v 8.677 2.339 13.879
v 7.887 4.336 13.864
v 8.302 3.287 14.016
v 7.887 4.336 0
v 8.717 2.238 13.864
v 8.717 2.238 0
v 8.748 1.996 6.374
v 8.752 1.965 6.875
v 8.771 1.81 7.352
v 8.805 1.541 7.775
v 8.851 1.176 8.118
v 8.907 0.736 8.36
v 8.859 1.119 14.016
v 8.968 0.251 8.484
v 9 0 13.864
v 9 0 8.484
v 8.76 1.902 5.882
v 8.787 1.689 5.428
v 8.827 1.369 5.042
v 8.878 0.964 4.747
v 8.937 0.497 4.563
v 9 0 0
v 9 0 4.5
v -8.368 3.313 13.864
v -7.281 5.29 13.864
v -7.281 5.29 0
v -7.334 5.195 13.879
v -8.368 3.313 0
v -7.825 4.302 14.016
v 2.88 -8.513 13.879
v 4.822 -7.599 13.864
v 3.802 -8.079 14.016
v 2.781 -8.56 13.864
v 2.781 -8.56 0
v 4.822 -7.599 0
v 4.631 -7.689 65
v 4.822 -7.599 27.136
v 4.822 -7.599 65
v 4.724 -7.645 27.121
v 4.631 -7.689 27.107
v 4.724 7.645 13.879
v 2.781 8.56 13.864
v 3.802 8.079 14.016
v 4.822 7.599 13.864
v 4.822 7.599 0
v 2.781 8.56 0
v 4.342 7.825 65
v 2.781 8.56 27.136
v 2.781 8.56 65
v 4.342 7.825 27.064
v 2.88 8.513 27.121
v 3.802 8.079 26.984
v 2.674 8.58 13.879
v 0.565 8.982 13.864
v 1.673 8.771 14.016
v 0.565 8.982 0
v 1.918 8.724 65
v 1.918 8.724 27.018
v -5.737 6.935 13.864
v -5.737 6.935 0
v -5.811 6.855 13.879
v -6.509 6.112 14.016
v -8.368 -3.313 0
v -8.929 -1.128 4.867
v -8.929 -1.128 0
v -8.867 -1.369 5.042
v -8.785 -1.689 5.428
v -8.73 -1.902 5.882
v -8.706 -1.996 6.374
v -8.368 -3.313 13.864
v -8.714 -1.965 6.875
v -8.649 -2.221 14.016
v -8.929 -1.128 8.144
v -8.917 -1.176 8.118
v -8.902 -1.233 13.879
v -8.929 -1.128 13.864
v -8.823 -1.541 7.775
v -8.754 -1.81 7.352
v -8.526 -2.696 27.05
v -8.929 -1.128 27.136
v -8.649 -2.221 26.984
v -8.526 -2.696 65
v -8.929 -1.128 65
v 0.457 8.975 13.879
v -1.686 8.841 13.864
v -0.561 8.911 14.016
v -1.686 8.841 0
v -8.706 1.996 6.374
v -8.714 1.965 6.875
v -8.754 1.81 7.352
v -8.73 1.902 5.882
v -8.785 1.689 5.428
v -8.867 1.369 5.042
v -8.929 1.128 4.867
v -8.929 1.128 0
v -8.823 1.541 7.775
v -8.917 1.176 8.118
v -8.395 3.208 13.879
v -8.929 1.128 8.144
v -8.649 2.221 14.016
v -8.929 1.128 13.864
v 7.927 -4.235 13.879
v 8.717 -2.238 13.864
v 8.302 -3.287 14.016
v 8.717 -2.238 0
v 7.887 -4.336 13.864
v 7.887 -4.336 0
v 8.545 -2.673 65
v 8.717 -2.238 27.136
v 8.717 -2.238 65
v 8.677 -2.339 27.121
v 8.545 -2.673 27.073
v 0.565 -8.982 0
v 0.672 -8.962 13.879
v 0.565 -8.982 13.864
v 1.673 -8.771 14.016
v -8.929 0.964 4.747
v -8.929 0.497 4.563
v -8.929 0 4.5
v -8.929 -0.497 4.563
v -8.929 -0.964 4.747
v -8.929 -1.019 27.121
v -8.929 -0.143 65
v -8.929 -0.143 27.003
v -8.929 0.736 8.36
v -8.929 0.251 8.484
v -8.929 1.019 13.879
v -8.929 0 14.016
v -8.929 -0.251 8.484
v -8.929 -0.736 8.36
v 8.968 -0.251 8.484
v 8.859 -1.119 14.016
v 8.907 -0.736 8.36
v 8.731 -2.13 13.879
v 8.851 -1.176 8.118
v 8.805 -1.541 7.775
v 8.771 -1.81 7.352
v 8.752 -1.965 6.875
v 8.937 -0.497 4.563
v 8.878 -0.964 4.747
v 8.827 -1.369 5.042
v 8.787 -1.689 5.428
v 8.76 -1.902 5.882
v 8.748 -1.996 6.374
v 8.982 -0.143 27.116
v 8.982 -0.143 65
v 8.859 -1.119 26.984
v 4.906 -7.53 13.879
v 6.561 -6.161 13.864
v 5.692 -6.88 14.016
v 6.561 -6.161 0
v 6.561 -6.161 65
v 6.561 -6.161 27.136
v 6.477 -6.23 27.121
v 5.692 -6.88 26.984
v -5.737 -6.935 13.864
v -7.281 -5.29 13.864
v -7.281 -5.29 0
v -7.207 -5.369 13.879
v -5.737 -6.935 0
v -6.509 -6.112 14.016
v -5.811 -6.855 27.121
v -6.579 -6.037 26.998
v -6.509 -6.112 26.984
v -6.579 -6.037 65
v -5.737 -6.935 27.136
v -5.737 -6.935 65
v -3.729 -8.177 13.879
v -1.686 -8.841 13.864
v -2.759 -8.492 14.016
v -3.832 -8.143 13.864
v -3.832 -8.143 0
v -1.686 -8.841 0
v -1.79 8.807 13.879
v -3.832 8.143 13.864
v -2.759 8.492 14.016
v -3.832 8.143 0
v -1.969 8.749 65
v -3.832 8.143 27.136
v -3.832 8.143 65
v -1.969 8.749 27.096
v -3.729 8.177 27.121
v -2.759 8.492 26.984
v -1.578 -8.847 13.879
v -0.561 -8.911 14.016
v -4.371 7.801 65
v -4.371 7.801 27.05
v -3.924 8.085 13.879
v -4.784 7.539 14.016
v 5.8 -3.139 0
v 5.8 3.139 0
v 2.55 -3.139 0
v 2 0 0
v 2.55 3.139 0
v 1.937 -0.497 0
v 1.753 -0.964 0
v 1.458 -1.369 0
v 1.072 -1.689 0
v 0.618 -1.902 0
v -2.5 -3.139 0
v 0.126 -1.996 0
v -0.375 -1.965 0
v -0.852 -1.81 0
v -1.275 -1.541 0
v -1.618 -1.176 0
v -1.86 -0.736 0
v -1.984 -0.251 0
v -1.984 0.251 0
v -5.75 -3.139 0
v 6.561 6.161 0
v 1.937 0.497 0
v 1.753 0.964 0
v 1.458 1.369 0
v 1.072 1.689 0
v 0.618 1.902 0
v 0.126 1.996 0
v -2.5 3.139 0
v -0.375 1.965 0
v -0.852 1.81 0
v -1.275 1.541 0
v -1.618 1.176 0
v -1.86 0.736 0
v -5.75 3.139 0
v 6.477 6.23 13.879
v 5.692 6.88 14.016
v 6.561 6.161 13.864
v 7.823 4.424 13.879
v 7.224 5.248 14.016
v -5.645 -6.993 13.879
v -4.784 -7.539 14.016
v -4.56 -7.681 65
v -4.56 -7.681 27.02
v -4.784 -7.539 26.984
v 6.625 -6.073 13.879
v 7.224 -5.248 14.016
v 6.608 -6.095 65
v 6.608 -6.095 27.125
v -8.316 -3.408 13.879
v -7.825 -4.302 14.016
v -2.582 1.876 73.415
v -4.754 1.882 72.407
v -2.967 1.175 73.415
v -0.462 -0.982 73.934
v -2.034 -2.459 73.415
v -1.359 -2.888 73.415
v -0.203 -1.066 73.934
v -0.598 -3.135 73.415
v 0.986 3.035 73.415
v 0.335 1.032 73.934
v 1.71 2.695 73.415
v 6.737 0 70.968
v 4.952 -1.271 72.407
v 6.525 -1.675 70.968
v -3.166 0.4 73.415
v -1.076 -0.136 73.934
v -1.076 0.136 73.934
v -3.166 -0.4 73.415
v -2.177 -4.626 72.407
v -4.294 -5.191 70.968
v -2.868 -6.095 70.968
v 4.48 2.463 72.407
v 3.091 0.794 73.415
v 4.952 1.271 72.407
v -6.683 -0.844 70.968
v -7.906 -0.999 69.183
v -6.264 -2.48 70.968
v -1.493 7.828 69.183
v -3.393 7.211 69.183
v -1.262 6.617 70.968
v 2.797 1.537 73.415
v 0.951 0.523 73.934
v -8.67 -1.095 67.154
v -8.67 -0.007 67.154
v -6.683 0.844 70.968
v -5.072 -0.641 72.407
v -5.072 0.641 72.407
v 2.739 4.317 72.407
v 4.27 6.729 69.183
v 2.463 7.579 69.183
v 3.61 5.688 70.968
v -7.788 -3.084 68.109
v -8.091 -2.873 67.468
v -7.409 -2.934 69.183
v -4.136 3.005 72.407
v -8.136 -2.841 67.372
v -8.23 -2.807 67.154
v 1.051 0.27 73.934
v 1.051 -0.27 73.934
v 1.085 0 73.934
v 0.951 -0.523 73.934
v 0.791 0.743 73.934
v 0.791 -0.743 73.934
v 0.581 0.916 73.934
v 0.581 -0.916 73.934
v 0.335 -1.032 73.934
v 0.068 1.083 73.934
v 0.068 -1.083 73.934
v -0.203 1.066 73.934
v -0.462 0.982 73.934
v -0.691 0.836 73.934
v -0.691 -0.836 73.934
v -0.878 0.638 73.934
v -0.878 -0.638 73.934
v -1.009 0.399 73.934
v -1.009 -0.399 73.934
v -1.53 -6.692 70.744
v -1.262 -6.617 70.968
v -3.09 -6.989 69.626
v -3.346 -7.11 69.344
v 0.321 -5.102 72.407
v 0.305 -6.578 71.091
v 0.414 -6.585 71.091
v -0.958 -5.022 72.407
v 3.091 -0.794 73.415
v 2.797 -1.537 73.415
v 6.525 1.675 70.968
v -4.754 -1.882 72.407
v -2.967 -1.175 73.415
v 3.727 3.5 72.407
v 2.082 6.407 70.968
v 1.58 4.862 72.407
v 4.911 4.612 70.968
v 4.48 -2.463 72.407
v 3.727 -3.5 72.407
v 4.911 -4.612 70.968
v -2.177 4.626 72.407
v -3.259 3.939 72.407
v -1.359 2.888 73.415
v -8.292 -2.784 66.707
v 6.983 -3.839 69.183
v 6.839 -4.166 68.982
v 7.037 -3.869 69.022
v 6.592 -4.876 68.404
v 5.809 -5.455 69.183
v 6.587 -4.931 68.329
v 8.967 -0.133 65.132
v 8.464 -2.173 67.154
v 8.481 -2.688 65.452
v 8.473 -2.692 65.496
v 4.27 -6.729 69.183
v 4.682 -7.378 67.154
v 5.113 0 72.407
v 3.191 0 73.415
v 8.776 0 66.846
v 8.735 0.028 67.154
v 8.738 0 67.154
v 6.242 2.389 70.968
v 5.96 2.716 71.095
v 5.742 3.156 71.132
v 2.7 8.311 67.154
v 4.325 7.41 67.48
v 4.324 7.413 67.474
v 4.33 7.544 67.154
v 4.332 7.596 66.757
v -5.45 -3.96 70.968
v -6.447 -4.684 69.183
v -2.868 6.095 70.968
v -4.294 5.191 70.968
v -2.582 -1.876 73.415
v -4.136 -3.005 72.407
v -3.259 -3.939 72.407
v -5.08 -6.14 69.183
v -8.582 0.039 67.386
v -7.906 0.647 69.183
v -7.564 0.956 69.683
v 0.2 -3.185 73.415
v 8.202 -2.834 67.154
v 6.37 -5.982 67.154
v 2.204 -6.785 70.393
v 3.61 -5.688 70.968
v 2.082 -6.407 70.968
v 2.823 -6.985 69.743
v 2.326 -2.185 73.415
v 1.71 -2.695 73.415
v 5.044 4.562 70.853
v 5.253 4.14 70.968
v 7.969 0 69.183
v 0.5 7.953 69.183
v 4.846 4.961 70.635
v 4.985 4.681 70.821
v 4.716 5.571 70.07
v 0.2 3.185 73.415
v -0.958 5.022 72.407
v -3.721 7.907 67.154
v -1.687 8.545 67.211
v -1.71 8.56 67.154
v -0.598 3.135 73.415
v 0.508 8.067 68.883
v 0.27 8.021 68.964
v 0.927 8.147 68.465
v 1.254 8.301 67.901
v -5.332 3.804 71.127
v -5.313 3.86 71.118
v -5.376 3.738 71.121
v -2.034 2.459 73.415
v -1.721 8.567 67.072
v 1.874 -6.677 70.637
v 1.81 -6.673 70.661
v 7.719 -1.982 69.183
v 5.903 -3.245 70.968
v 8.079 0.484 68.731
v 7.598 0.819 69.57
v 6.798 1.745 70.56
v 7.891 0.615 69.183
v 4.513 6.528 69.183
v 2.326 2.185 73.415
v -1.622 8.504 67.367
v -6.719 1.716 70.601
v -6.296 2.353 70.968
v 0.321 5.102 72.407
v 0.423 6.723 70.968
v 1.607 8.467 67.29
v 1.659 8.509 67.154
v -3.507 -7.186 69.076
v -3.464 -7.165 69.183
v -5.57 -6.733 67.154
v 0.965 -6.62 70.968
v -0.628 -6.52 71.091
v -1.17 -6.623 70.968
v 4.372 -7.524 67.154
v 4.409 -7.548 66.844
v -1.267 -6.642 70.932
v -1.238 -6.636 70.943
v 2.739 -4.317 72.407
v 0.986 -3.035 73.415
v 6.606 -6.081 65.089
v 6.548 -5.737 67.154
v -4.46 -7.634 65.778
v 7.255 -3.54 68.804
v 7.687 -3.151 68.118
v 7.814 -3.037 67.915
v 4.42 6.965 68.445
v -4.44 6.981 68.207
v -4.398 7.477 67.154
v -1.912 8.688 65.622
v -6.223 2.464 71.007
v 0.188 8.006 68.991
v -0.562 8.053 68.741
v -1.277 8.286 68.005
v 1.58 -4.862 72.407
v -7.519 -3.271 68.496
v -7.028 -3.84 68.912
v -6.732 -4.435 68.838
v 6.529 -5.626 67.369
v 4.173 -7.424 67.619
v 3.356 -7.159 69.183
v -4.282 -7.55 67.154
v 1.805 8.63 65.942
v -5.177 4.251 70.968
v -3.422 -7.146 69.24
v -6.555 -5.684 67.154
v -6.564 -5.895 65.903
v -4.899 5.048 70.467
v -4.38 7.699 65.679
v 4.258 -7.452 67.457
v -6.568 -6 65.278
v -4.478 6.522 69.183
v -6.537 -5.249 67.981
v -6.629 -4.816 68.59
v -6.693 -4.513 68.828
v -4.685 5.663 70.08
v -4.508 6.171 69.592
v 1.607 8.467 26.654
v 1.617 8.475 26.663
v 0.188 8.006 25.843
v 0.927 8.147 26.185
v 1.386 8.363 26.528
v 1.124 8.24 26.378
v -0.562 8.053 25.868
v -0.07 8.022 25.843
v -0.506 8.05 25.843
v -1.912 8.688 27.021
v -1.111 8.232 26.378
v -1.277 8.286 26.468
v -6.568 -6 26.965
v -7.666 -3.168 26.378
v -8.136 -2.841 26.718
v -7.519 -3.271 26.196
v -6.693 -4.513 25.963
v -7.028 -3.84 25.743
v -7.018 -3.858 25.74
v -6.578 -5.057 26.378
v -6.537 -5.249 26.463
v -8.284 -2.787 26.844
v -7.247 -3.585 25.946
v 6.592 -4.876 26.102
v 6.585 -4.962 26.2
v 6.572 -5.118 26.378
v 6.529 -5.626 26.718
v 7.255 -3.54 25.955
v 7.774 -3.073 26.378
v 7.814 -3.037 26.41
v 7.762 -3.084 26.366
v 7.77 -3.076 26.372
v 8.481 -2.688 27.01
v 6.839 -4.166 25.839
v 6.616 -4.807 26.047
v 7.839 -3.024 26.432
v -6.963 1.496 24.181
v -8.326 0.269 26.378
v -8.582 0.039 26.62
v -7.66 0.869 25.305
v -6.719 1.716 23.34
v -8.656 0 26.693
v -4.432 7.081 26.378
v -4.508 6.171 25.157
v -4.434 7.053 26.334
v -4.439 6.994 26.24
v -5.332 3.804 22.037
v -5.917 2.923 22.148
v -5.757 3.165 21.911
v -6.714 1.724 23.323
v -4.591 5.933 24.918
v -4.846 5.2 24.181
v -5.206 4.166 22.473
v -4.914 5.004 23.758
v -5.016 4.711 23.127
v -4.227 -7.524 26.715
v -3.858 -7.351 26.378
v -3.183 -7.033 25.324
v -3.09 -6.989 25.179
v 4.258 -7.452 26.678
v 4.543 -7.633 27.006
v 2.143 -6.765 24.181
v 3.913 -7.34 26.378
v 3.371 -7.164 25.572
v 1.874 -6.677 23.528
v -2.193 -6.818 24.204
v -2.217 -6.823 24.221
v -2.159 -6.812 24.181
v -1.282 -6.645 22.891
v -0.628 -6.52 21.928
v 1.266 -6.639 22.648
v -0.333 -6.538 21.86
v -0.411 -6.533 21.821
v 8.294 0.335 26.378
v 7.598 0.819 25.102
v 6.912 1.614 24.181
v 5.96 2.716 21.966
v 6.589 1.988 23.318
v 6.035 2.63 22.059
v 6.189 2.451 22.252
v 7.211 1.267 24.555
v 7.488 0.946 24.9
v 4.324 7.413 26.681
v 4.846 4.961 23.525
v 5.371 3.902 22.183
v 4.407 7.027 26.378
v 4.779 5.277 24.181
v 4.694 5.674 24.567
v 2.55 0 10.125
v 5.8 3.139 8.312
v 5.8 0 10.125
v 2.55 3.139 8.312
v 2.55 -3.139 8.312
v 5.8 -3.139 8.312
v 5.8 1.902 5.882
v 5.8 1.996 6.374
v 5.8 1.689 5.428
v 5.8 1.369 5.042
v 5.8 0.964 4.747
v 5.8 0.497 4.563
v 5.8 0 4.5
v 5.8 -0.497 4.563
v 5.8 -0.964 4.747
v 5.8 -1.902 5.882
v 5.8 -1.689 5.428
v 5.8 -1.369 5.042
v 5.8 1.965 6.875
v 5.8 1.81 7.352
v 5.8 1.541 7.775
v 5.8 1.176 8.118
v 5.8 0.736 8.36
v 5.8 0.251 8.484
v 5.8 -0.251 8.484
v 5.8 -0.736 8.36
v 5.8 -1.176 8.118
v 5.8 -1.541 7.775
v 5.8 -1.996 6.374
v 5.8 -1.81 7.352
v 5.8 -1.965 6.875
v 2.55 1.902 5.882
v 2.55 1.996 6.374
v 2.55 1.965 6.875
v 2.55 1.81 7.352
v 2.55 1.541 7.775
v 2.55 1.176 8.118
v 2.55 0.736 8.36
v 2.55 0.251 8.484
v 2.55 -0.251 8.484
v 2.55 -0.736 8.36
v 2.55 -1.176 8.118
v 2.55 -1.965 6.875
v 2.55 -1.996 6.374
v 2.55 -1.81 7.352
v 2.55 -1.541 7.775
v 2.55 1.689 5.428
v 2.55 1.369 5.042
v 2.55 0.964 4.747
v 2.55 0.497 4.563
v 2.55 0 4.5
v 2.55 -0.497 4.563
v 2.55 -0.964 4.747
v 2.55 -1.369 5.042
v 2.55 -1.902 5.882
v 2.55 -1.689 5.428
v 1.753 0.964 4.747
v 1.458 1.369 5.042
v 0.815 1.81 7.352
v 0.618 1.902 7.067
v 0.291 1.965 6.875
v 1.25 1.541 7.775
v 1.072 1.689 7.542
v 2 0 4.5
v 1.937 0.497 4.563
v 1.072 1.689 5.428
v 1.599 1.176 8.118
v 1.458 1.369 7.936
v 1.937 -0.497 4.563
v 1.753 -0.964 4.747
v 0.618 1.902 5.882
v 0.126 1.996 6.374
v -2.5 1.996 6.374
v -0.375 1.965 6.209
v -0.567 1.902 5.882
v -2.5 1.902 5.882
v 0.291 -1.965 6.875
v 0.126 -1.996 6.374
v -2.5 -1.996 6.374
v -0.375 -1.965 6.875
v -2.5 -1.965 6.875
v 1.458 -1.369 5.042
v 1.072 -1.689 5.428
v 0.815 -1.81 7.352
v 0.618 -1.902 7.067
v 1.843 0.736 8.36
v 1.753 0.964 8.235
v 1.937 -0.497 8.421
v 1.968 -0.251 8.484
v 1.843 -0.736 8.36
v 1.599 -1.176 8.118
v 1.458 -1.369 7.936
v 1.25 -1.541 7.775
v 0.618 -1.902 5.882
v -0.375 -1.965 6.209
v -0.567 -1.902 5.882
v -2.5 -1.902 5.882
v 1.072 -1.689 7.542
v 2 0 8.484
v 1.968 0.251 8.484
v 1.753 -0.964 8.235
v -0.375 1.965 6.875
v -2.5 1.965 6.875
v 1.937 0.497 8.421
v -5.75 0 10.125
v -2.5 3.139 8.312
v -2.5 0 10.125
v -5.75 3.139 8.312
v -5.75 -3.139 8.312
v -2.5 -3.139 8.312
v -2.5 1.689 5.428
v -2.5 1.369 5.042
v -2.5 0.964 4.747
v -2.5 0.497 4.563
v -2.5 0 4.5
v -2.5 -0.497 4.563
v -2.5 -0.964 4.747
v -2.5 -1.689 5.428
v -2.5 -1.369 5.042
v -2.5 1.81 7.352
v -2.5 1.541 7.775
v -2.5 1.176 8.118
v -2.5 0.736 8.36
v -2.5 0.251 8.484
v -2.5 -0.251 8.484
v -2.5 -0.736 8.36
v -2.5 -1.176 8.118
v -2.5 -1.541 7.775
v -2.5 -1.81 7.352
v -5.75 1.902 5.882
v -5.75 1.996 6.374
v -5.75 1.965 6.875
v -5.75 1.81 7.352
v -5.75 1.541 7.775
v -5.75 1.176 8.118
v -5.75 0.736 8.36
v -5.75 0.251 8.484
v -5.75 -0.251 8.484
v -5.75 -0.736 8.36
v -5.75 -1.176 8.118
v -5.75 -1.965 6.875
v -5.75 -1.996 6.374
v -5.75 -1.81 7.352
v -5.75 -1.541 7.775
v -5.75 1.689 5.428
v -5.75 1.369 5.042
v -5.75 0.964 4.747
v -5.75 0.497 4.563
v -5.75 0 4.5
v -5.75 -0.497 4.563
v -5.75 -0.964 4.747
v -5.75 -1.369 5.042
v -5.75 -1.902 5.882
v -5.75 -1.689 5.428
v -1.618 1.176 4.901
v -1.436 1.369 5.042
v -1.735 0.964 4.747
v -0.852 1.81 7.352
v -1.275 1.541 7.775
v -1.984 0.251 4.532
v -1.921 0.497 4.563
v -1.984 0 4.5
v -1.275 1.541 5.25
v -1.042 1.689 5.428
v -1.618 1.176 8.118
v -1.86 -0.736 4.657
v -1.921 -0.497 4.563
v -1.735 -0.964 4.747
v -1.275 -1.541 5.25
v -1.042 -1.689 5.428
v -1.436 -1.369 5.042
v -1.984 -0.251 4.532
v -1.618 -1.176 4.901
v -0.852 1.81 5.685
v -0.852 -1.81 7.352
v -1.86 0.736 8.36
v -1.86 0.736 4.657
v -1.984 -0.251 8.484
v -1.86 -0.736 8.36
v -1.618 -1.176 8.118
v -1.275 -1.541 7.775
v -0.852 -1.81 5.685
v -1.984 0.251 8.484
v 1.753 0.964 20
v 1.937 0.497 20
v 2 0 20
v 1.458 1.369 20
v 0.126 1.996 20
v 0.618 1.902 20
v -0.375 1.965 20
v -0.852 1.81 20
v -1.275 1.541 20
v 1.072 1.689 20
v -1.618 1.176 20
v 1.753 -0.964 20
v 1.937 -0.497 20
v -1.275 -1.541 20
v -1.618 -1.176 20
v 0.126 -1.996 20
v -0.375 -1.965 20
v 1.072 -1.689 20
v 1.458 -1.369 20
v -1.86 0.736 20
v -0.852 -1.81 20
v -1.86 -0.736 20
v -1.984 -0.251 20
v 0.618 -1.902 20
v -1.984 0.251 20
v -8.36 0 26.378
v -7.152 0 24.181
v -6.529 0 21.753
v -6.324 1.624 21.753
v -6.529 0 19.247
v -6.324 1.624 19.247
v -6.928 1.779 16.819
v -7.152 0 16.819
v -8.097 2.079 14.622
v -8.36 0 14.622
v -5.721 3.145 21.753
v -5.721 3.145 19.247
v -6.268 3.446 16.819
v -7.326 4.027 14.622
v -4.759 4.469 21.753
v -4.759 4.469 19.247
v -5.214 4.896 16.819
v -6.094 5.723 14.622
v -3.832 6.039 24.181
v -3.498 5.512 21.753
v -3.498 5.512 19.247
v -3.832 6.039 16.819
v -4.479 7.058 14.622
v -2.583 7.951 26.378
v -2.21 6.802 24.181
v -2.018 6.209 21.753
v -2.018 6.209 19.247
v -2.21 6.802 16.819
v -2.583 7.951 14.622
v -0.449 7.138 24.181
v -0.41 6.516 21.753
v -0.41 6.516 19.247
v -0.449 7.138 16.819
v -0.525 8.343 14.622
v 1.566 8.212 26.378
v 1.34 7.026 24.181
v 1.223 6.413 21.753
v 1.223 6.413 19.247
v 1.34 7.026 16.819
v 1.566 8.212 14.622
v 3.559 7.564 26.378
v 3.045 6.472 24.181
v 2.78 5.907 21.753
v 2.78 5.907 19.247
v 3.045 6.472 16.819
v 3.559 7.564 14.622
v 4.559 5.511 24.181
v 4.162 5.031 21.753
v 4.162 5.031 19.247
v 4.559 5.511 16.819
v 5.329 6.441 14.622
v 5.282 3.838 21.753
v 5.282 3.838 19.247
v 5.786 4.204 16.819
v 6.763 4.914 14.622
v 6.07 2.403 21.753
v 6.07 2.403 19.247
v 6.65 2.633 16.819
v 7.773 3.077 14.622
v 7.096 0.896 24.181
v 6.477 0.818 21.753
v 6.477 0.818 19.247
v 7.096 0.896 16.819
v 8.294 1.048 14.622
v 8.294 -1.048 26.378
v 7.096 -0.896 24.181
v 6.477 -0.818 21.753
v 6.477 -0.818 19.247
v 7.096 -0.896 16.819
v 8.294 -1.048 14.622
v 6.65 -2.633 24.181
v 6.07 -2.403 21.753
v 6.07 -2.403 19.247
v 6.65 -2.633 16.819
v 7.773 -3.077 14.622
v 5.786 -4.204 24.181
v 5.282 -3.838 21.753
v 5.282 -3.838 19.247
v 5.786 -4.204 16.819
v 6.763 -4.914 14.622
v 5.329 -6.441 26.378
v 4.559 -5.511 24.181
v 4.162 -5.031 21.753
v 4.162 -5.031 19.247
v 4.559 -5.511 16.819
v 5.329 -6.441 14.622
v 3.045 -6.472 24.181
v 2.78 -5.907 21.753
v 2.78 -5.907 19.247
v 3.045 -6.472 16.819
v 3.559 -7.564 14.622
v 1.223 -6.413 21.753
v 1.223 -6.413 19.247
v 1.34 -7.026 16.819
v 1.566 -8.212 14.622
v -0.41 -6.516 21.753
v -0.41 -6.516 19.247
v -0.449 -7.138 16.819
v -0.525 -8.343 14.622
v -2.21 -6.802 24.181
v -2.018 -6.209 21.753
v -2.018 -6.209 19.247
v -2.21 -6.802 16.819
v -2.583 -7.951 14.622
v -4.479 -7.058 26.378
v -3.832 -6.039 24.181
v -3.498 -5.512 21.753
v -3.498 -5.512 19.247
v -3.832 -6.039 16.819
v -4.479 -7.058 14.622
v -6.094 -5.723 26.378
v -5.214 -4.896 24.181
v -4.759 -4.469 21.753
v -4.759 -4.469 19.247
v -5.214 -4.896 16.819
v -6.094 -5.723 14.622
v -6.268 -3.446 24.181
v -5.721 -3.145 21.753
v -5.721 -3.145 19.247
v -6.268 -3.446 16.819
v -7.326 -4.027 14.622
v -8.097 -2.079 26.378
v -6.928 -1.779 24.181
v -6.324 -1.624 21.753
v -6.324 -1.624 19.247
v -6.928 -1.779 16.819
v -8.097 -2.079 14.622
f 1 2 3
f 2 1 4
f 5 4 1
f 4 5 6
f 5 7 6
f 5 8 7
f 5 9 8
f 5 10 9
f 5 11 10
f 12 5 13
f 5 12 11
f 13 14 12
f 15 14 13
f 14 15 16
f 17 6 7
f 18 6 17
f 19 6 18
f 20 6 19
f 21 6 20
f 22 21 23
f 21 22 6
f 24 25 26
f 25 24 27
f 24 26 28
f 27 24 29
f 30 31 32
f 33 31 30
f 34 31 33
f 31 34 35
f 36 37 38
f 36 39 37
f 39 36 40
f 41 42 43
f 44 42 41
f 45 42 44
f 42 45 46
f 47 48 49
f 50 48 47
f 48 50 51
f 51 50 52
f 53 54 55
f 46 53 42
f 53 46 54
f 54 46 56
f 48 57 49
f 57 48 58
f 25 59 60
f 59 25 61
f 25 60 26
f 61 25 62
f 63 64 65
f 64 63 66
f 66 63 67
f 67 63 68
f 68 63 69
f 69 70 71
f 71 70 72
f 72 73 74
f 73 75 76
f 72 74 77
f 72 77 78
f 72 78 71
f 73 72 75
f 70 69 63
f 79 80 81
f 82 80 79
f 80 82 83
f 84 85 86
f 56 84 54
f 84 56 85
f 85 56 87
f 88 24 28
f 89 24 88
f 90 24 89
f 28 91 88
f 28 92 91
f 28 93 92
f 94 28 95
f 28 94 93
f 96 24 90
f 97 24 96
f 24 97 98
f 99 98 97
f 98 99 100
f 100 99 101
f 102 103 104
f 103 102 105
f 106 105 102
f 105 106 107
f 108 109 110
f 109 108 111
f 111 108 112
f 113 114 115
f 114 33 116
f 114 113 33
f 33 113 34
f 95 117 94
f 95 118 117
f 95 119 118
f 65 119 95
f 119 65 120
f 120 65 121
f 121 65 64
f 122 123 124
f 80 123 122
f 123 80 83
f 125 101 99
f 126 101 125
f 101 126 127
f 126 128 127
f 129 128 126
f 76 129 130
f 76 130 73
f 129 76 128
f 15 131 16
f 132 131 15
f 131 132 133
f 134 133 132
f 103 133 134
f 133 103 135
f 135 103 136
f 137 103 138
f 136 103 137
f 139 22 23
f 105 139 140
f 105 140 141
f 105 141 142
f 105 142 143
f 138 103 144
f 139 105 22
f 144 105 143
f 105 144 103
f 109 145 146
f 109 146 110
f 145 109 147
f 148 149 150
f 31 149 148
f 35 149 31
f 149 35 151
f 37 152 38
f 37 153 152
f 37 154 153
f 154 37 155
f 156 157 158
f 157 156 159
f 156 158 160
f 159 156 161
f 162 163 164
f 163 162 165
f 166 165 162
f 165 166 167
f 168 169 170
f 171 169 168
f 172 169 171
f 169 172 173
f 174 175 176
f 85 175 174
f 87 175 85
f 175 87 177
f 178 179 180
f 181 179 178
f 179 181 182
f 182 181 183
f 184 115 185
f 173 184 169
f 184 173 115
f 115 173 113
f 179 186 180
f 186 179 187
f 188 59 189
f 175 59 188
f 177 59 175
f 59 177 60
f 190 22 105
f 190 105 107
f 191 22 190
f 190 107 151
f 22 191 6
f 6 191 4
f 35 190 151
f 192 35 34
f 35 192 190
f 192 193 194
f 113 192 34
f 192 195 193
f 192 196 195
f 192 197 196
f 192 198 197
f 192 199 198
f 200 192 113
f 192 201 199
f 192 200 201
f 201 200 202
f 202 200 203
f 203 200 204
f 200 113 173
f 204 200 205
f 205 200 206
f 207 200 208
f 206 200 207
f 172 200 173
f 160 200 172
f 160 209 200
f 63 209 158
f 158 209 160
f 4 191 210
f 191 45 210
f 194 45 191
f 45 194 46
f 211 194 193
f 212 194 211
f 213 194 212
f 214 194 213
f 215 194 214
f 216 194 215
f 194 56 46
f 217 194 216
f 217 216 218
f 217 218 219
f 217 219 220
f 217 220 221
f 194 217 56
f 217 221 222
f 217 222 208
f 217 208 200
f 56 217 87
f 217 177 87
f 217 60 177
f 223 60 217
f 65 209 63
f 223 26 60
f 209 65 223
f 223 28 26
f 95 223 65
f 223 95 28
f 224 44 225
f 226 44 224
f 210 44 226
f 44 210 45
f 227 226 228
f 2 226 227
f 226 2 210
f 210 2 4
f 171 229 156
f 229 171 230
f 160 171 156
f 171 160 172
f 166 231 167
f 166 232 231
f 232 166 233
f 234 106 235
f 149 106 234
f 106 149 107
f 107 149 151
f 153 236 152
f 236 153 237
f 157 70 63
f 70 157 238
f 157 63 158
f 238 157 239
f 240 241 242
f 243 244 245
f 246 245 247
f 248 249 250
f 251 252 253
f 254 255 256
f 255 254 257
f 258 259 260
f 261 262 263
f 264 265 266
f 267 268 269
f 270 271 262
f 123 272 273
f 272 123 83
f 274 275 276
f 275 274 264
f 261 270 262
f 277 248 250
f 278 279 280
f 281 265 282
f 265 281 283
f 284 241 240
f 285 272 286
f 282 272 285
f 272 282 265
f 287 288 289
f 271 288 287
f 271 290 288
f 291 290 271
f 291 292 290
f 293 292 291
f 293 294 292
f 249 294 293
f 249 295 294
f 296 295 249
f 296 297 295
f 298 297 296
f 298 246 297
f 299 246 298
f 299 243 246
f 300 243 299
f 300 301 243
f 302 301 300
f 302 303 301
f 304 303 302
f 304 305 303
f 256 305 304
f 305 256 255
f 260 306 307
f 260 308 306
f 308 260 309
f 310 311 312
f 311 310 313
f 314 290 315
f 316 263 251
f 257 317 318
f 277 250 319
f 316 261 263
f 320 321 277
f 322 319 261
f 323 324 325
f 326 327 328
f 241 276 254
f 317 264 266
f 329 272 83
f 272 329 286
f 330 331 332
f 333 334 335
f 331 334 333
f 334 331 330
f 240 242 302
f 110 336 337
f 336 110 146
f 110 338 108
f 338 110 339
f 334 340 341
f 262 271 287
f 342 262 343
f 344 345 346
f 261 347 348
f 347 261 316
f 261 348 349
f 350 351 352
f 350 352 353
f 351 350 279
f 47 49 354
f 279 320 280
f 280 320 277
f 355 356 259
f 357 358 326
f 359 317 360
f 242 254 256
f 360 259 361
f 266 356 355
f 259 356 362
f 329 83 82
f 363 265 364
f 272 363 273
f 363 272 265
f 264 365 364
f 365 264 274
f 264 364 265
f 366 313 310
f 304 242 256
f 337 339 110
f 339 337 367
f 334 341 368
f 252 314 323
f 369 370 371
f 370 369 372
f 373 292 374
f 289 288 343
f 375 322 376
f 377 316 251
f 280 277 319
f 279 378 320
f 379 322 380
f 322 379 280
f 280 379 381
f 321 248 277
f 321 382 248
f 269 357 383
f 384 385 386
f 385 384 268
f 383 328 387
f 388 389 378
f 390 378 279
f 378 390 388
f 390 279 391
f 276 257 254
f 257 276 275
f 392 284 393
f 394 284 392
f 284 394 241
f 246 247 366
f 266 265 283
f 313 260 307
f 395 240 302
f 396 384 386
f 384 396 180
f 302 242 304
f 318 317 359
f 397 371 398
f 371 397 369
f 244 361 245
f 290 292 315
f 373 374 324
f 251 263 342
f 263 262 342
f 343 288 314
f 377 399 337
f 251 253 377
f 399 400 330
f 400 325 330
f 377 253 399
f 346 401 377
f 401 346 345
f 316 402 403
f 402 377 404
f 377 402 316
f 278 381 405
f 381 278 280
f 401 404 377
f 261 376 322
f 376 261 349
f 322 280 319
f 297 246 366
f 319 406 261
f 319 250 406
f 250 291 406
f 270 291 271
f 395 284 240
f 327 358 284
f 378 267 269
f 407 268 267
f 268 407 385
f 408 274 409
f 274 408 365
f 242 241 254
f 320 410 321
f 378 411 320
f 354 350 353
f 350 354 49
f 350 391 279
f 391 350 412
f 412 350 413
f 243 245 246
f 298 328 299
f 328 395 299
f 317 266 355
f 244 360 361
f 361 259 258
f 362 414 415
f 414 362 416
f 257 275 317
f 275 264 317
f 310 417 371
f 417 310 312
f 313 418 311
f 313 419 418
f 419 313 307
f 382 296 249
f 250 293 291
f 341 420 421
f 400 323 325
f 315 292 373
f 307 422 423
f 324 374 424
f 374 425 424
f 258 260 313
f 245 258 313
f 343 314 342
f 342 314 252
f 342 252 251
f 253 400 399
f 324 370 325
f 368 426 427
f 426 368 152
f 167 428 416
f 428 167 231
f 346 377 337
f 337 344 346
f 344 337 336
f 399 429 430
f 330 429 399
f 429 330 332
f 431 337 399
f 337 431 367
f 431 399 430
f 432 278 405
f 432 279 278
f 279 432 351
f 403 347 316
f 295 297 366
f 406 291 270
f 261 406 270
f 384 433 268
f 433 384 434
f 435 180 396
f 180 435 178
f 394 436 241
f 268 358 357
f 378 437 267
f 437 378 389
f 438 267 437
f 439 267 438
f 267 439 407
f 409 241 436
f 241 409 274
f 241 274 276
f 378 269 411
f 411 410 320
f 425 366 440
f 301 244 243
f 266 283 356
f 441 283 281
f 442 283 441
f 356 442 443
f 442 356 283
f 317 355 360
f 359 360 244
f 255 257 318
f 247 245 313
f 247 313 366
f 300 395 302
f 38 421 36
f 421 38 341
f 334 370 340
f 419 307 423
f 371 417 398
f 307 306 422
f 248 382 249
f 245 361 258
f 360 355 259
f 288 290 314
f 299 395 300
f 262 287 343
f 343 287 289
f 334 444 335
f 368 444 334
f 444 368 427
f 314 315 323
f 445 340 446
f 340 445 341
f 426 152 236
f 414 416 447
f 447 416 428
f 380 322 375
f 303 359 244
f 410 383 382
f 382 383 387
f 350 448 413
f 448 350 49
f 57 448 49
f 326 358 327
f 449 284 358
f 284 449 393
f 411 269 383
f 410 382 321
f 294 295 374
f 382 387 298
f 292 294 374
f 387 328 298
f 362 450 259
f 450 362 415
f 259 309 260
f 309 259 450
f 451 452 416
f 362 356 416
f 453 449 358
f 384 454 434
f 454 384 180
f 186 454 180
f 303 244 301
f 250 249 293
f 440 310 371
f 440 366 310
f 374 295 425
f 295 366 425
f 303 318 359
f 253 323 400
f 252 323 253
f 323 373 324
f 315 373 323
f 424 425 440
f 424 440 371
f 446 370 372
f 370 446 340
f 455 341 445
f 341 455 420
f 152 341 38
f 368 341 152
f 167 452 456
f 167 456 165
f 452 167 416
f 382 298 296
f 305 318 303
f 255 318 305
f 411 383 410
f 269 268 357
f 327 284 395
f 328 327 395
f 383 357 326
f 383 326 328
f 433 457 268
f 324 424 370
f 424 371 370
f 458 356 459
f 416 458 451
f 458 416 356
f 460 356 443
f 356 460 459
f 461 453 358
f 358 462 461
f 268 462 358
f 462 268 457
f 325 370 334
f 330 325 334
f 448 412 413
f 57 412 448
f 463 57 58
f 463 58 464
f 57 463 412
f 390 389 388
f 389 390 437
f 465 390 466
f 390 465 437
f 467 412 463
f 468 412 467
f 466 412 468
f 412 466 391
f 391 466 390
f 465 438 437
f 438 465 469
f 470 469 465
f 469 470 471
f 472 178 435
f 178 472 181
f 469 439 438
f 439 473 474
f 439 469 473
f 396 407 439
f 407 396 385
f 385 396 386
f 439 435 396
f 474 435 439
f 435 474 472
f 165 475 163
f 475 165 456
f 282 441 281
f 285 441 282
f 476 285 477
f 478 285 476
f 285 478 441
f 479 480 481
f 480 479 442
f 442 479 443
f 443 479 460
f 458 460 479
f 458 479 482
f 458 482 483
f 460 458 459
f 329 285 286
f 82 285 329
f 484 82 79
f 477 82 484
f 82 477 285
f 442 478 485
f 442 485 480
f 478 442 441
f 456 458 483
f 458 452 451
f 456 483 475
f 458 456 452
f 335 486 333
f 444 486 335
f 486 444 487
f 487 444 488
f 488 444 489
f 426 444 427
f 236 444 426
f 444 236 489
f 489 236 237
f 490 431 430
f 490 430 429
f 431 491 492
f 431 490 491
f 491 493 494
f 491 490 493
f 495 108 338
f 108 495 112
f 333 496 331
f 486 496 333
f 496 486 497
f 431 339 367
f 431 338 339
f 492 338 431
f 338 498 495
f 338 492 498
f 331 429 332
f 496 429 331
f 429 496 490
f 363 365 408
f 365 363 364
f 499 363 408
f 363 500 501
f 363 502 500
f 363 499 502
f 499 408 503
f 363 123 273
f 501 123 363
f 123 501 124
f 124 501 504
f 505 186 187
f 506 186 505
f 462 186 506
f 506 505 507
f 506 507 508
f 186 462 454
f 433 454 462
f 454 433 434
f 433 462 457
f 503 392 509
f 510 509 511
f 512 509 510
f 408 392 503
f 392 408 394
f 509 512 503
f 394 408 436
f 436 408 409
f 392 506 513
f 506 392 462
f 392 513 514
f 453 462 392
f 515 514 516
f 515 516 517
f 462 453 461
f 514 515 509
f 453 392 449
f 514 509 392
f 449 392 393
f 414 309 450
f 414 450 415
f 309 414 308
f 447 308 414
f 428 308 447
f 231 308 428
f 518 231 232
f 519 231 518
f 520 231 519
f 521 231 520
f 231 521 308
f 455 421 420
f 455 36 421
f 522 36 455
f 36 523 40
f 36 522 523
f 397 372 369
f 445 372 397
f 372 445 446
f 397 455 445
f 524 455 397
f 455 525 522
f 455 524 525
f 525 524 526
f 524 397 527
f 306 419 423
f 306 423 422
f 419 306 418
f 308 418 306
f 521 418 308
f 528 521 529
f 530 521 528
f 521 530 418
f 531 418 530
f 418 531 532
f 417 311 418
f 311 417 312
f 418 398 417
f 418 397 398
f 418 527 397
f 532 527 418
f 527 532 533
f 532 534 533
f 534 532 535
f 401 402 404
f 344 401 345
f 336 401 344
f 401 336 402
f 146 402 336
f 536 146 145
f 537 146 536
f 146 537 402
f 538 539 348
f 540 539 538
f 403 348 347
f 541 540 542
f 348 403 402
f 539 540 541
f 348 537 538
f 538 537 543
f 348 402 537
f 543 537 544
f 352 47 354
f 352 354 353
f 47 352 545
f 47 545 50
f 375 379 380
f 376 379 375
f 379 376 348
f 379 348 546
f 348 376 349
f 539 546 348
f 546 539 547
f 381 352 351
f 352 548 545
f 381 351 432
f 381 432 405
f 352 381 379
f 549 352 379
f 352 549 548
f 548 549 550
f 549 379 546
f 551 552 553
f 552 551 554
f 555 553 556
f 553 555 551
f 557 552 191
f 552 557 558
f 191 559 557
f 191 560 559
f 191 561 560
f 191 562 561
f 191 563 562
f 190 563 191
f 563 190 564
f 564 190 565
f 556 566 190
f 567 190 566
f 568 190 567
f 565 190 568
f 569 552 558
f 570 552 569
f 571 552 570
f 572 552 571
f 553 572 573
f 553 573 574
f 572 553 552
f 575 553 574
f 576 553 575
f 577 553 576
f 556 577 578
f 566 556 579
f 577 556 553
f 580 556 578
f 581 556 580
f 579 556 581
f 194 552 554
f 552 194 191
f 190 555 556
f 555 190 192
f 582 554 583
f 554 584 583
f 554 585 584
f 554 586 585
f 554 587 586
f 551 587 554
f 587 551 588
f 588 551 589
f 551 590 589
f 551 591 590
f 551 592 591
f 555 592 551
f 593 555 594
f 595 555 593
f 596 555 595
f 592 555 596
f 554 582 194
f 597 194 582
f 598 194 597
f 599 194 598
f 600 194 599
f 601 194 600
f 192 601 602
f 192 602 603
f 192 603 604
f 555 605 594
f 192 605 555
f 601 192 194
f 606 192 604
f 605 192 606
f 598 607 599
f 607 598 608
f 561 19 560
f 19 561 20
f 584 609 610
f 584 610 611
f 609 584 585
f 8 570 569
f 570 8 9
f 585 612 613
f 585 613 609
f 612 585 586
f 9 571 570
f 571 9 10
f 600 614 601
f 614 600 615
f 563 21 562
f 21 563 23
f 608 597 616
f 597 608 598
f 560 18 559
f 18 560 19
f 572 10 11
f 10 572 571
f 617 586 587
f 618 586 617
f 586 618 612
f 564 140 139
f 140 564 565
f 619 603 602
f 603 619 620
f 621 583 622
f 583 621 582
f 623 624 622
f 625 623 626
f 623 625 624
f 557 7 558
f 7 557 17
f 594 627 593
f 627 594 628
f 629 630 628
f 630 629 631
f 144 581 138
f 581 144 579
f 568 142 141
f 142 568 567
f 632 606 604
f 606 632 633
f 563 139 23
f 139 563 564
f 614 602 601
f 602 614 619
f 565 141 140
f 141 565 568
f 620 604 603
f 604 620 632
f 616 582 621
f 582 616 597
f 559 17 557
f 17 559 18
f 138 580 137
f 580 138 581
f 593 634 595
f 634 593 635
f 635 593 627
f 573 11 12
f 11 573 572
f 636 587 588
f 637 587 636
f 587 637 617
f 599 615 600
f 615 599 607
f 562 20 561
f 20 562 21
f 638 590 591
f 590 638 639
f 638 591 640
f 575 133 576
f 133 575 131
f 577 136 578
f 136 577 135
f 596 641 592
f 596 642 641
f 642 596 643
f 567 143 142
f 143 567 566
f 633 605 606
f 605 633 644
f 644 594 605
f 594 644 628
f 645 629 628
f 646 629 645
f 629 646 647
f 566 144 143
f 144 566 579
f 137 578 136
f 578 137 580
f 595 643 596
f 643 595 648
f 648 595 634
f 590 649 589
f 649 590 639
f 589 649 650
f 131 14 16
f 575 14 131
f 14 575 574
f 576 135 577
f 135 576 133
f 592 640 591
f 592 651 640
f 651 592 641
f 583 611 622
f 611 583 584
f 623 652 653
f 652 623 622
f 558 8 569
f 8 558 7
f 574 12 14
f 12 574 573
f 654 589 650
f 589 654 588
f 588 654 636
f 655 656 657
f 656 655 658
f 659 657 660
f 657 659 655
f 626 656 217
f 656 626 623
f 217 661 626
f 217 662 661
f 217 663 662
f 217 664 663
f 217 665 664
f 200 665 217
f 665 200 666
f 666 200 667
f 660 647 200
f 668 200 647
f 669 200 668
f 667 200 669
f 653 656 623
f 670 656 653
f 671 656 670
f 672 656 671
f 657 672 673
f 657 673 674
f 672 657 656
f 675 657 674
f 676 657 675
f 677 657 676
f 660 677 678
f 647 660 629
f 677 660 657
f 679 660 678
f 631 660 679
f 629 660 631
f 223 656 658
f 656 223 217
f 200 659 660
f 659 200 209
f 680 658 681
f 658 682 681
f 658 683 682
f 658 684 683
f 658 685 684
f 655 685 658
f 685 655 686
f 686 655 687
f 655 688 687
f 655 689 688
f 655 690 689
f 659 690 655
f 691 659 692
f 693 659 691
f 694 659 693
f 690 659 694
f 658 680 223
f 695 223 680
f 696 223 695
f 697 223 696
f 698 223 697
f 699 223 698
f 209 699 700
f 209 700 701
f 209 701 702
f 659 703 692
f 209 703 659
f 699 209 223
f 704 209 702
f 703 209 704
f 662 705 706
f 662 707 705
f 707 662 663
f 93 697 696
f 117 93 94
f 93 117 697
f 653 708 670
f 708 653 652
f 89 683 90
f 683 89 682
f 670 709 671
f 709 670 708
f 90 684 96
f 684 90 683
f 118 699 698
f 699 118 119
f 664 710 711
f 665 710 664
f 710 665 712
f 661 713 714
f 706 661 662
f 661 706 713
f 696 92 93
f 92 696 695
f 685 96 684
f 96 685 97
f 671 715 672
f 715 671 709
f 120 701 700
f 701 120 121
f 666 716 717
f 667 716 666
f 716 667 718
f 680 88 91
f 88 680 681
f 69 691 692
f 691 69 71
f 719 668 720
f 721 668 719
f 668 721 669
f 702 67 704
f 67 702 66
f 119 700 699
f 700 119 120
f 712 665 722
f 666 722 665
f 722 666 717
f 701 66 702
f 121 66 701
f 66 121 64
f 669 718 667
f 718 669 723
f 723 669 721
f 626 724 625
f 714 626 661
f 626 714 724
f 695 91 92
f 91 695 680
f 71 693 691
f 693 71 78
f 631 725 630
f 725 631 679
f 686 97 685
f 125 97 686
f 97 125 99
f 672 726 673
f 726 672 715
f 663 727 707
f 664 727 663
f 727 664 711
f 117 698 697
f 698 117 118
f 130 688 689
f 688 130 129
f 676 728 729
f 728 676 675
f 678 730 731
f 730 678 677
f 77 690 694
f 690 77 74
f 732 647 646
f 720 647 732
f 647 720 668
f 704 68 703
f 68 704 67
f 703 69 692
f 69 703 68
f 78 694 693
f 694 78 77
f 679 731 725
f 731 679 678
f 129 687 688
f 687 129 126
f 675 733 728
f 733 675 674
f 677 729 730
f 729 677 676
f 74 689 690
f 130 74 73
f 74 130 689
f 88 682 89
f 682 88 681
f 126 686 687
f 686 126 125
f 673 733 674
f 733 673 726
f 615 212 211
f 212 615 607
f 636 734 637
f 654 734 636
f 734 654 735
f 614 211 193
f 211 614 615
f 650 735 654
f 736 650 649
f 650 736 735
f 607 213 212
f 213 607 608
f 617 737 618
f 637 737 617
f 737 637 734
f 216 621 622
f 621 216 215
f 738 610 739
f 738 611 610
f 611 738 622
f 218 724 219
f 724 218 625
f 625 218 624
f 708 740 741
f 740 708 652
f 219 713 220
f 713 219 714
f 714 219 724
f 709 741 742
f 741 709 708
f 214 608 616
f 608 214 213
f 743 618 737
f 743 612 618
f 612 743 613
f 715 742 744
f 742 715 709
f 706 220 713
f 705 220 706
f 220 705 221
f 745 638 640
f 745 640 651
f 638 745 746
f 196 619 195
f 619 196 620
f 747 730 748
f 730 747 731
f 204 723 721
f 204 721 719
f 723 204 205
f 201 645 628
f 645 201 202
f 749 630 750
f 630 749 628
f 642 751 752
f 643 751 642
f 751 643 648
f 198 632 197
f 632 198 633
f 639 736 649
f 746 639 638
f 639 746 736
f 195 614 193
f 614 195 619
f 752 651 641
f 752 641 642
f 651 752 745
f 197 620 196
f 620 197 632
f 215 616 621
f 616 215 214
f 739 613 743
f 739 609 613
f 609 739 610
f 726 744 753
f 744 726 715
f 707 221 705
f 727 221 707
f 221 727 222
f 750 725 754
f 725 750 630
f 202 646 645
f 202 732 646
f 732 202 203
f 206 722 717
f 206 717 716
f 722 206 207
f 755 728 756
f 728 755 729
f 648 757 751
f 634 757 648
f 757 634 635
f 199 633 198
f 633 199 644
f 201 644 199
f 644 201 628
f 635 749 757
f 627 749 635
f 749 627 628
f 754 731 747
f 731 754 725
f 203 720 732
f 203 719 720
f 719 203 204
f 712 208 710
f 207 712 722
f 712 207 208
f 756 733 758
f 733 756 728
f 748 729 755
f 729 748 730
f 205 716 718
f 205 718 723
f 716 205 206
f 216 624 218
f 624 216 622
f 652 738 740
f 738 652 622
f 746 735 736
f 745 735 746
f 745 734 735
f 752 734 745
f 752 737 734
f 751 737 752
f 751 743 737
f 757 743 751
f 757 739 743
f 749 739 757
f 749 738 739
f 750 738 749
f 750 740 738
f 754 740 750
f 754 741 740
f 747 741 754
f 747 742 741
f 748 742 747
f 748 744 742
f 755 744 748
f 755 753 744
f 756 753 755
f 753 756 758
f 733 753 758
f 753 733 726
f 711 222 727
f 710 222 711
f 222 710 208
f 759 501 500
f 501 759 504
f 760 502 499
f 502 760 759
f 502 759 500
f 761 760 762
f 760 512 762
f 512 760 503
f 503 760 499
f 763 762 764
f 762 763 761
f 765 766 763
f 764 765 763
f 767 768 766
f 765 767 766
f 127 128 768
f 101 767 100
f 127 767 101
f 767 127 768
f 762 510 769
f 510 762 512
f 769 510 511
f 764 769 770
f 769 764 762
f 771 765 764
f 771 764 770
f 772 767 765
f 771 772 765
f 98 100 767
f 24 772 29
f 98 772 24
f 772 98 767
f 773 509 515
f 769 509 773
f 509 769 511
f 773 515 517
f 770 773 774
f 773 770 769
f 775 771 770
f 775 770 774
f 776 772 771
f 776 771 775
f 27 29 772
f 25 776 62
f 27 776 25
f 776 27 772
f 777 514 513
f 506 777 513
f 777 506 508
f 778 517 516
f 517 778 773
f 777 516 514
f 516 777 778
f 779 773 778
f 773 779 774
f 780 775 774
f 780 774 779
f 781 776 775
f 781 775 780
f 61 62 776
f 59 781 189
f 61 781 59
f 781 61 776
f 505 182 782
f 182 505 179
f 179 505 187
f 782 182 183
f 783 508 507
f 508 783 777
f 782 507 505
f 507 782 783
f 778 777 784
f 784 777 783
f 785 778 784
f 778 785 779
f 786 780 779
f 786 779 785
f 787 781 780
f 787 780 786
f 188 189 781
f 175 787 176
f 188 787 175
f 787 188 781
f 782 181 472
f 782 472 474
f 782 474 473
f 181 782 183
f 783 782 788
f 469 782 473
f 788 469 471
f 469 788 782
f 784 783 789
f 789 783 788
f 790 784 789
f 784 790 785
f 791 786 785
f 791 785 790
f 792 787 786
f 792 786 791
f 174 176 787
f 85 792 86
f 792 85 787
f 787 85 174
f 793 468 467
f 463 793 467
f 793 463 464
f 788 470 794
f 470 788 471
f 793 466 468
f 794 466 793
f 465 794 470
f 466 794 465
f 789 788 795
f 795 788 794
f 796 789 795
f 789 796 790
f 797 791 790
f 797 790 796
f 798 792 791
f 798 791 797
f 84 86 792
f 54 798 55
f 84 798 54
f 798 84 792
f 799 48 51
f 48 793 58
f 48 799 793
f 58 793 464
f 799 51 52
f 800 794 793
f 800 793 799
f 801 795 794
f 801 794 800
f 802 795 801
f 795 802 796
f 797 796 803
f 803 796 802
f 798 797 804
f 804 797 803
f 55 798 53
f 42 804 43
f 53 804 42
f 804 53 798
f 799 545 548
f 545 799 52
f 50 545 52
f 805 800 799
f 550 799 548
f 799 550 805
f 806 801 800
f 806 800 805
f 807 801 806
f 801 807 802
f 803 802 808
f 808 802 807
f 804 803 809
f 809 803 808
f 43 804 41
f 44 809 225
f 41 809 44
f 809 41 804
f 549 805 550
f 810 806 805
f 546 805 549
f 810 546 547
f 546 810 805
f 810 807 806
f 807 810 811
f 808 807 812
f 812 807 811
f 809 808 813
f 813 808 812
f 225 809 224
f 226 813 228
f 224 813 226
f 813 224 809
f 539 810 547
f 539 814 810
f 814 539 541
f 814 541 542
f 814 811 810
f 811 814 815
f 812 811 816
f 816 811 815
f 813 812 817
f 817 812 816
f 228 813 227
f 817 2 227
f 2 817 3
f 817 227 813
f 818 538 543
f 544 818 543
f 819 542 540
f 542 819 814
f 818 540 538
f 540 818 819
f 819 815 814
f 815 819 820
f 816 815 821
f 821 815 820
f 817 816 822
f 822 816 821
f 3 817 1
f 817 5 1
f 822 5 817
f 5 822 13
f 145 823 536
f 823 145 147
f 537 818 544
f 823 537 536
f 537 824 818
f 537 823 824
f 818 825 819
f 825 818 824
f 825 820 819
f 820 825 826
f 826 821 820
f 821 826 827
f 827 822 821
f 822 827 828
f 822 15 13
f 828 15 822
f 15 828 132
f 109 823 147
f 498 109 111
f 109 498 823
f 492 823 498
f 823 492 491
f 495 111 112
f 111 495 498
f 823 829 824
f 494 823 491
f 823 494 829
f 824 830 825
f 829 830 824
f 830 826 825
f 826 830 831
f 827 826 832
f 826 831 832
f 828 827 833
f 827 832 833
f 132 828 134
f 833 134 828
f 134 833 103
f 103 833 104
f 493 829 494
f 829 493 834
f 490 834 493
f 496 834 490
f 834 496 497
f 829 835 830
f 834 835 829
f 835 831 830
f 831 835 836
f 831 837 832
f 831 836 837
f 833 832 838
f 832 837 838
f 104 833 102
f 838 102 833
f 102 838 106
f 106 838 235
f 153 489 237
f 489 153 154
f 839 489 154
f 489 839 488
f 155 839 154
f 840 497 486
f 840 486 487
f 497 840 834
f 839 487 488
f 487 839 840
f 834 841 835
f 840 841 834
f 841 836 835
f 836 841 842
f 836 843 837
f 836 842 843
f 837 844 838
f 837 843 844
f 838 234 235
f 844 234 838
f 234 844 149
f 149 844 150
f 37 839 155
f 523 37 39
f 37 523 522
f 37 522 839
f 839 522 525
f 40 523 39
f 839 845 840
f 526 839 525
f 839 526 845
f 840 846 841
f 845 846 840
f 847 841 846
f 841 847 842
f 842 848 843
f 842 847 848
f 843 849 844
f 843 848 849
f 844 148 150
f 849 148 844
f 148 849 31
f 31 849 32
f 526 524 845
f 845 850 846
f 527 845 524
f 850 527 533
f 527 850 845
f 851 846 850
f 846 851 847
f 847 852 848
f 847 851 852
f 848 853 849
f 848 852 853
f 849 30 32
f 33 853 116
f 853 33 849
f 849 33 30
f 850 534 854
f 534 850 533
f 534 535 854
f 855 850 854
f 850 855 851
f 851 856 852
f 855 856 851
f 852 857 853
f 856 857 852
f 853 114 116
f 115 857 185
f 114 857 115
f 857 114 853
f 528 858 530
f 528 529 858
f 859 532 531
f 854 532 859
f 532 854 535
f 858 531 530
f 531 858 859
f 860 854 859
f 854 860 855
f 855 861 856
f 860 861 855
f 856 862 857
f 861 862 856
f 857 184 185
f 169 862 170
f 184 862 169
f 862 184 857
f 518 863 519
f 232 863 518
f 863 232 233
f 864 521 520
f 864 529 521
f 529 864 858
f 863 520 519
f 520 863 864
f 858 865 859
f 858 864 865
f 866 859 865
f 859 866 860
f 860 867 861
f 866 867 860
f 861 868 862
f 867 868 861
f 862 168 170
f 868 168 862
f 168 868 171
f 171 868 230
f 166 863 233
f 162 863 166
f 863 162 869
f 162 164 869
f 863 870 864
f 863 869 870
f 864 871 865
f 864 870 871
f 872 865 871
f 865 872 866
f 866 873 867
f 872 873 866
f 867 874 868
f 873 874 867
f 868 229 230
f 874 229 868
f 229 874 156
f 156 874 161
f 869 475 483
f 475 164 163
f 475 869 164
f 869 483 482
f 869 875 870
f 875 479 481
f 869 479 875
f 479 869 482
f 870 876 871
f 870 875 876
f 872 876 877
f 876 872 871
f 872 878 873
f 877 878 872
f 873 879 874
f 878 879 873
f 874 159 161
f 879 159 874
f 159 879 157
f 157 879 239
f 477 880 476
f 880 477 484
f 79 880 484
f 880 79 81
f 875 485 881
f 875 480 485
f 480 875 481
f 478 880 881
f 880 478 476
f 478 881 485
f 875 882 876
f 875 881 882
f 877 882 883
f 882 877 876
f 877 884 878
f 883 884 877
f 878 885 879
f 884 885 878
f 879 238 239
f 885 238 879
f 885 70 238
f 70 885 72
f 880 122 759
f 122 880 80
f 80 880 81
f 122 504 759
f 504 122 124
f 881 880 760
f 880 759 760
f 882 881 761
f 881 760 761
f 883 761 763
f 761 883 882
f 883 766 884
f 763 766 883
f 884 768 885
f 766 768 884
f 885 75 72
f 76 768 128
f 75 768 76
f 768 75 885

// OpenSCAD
//Variables

// preview[view:north east, tilt:side]

//The units of your Drill Bit.
Drill_Bit_Diameter_Units=1; //[1: Millimeter, 2:Inches]

//Diameter of the Drill bit.  Only accepts Decimals. No Fractions
Drill_Bit_Diameter=3; 

//Drill Bit Length: How Far do you want the Drill Bit to go into the Handle
Drill_Bit_Length=20;

//Length of the Handle
Handle_Length=65; 

//Diameter of the Handle
Handle_Diameter=15; 


//Diameter of the set Screw
Set_Screw_Diameter=3; 

//Thickness of the set Screw Nut
Set_Screw_Nut_Thickness=3; 

//Diameter of the Set Screw Nut
Set_Screw_Nut_Diameter=5.5; 

//Number of Nut Traps
Number_of_Nut_Traps=2;

//The Overall Resolution of the Handle
Resolution=25; 

//Ignore these variables


db_d=Drill_Bit_Diameter;
hl=Handle_Length;
hd=Handle_Diameter;
db_l=Drill_Bit_Length;
db_d=Drill_Bit_Diameter;
ss_d=Set_Screw_Diameter;
ss_n_t=Set_Screw_Nut_Thickness;
ss_n_d=Set_Screw_Nut_Diameter;
$fn=Resolution;




if(Drill_Bit_Diameter_Units==1){
Drill_Bit_Handle_Metric();
}
if(Drill_Bit_Diameter_Units==2){
Drill_Bit_Handle();
}




module Drill_Bit_Handle_Metric(){

	difference(){
	
		//Main Body of the Drill Bit Handle
		union(){

			cylinder(hl,(hd+db_d)/2,(hd+db_d)/2); 
			translate([0,0,hl])
				sphere((hd+db_d)/2);

		}

		//Hole for Drill Bit
		cylinder(db_l,(db_d+1)/2,(db_d+1)/2); 
	
		
		//This is the Groove on the bottom of the handle	
		translate([0,0,(ss_n_d)+15])
			rotate_extrude(convexity = 10)
				translate([((hd+db_d)/2)+7.45, 0, 0])
					circle(r = 10);
	
		// Small Grooves for the Handle
		for ( i = [0 : 3] ){	
		    rotate( i * 360 / 3, [0, 0, 1])
		  	  translate([0, ((hd+db_d)/2)+2, (ss_n_d/2)+17])
		  		 cylinder(hl-((ss_n_d/2)),3,3);
		}
			
			//Large Grooves for the handle
			
			
				rotate([0,0,360/6]){
					for ( i = [0 : 3] ){	
					    rotate( i * 360 / 3, [0, 0, 1])
					  	  translate([0,  ((hd+db_d)+(13)+2)/2, (ss_n_d/2)+17])
					  		cylinder(hl-((ss_n_d/2)),(20)/2,(20)/2);
					}
				}
			
		
		
			//Nut Trap
		
		if (Number_of_Nut_Traps==2){
		
			translate([db_d/2+(ss_n_t-.45),0,ss_n_d+1]){
			
			union(){
				hull(){
		
					rotate([0,90,0])
						translate([0,0,ss_n_t/-2])
							hexagon(ss_n_t+.25,(ss_n_d+1.75)/2);
		
					rotate([0,90,0])
						translate([(ss_n_d/2)+10,0,ss_n_t/-2])
							hexagon(ss_n_t+.25,(ss_n_d+1.75)/2);
		
				}
	
			rotate([0,90,0])
				translate([0,0,(hd+db_d)/-7+ss_n_t/-2])
					cylinder((hd+db_d+1)/2,(ss_d+1)/2,(ss_d+1)/2);
		
			}
			}
			
			}
			//Nut Trap
			translate([db_d/-2-(ss_n_t-.25),0,ss_n_d+1]){
		
				hull(){
		
					rotate([0,90,0])
						translate([0,0,ss_n_t/-2])
							hexagon(ss_n_t+.25,(ss_n_d+1.75)/2);
		
					rotate([0,90,0])
						translate([(ss_n_d/2)+10,0,ss_n_t/-2])
							hexagon(ss_n_t+.25,(ss_n_d+1.75)/2);
		
				}
	
			rotate([0,90,0])
				translate([0,0,(hd+db_d)/-5.1+ss_n_t/-2])
					cylinder((hd+db_d+1)/2,(ss_d+1)/2,(ss_d+1)/2);
		
			}
	
	}
	

	}

module Drill_Bit_Handle(){

difference(){

	//Main Body of the Drill Bit Handle
	union(){
	
		cylinder(hl,(hd+(db_d*25.4))/2,(hd+(db_d*25.4))/2); 
	
		translate([0,0,hl])	
			sphere((hd+(db_d*25.4))/2);
	
	}
	
	//Hole for Drill Bit
	cylinder(db_l,((db_d*25.4)+1)/2,((db_d*25.4)+1)/2); 

	//This is the Groove on the bottom of the handle 

	translate([0,0,(ss_n_d)+15])
		rotate_extrude(convexity = 10)
			translate([((hd+(db_d*25.4))/2)+7.45, 0, 0])
				circle(r = 10);

	// Small Grooves for the Handle
	for ( i = [0 : 3] ){ 

		rotate( i * 360 / 3, [0, 0, 1])

		translate([0, ((hd+(db_d*25.4))/2)+2, (ss_n_d/2)+17])
			cylinder(hl-((ss_n_d/2)),3,3);

	}
	//Large Grooves for the handle
	rotate([0,0,360/6]){

		for ( i = [0 : 3] ){ 

		rotate( i * 360 / 3, [0, 0, 1])

		translate([0, ((hd+(db_d*25.4))+(13)+2)/2, (ss_n_d/2)+17])
			cylinder(hl-((ss_n_d/2)),(20)/2,(20)/2);

		}

	}

	//Nut Trap
	if (Number_of_Nut_Traps==2){

		translate([(db_d*25.4)/2+(ss_n_t-.45),0,ss_n_d+1]){

			union(){

				hull(){

					rotate([0,90,0])
						translate([0,0,ss_n_t/-2])
							hexagon(ss_n_t+.25,(ss_n_d+1.75)/2);

	rotate([0,90,0])
		translate([(ss_n_d/2)+10,0,ss_n_t/-2])
			hexagon(ss_n_t+.25,(ss_n_d+1.75)/2);

	}

	rotate([0,90,0])
		translate([0,0,(hd+(db_d*25.4))/-7+ss_n_t/-2])
			cylinder((hd+(db_d*25.4)+1)/2,(ss_d+1)/2,(ss_d+1)/2);

	}

	}

	}

	//Nut Trap

	translate([(db_d*25.4)/-2-(ss_n_t-.25),0,ss_n_d+1]){

		hull(){
	
		rotate([0,90,0])
			translate([0,0,ss_n_t/-2])
				hexagon(ss_n_t+.25,(ss_n_d+1.75)/2);
	
		rotate([0,90,0])
			translate([(ss_n_d/2)+10,0,ss_n_t/-2])
				hexagon(ss_n_t+.25,(ss_n_d+1.75)/2);
	
		}

	rotate([0,90,0])
		translate([0,0,(hd+(db_d*25.4))/-5.1+ss_n_t/-2])
			cylinder((hd+(db_d*25.4)+1)/2,(ss_d+1)/2,(ss_d+1)/2);

	}

	}

}



			
			



module reg_polygon(sides,radius)
{
  function dia(r) = sqrt(pow(r*2,2)/2);  //sqrt((r*2^2)/2) if only we had an exponention op
  if(sides<2) square([radius,0]);
  if(sides==3) triangle(radius);
  if(sides==4) square([dia(radius),dia(radius)],center=true);
  if(sides>4) circle(r=radius,$fn=sides);
}

module hexagonf(radius)
{
  reg_polygon(6,radius);
}

module hexagon(height,radius) 
{
  linear_extrude(height=height) hexagonf(radius);
}
